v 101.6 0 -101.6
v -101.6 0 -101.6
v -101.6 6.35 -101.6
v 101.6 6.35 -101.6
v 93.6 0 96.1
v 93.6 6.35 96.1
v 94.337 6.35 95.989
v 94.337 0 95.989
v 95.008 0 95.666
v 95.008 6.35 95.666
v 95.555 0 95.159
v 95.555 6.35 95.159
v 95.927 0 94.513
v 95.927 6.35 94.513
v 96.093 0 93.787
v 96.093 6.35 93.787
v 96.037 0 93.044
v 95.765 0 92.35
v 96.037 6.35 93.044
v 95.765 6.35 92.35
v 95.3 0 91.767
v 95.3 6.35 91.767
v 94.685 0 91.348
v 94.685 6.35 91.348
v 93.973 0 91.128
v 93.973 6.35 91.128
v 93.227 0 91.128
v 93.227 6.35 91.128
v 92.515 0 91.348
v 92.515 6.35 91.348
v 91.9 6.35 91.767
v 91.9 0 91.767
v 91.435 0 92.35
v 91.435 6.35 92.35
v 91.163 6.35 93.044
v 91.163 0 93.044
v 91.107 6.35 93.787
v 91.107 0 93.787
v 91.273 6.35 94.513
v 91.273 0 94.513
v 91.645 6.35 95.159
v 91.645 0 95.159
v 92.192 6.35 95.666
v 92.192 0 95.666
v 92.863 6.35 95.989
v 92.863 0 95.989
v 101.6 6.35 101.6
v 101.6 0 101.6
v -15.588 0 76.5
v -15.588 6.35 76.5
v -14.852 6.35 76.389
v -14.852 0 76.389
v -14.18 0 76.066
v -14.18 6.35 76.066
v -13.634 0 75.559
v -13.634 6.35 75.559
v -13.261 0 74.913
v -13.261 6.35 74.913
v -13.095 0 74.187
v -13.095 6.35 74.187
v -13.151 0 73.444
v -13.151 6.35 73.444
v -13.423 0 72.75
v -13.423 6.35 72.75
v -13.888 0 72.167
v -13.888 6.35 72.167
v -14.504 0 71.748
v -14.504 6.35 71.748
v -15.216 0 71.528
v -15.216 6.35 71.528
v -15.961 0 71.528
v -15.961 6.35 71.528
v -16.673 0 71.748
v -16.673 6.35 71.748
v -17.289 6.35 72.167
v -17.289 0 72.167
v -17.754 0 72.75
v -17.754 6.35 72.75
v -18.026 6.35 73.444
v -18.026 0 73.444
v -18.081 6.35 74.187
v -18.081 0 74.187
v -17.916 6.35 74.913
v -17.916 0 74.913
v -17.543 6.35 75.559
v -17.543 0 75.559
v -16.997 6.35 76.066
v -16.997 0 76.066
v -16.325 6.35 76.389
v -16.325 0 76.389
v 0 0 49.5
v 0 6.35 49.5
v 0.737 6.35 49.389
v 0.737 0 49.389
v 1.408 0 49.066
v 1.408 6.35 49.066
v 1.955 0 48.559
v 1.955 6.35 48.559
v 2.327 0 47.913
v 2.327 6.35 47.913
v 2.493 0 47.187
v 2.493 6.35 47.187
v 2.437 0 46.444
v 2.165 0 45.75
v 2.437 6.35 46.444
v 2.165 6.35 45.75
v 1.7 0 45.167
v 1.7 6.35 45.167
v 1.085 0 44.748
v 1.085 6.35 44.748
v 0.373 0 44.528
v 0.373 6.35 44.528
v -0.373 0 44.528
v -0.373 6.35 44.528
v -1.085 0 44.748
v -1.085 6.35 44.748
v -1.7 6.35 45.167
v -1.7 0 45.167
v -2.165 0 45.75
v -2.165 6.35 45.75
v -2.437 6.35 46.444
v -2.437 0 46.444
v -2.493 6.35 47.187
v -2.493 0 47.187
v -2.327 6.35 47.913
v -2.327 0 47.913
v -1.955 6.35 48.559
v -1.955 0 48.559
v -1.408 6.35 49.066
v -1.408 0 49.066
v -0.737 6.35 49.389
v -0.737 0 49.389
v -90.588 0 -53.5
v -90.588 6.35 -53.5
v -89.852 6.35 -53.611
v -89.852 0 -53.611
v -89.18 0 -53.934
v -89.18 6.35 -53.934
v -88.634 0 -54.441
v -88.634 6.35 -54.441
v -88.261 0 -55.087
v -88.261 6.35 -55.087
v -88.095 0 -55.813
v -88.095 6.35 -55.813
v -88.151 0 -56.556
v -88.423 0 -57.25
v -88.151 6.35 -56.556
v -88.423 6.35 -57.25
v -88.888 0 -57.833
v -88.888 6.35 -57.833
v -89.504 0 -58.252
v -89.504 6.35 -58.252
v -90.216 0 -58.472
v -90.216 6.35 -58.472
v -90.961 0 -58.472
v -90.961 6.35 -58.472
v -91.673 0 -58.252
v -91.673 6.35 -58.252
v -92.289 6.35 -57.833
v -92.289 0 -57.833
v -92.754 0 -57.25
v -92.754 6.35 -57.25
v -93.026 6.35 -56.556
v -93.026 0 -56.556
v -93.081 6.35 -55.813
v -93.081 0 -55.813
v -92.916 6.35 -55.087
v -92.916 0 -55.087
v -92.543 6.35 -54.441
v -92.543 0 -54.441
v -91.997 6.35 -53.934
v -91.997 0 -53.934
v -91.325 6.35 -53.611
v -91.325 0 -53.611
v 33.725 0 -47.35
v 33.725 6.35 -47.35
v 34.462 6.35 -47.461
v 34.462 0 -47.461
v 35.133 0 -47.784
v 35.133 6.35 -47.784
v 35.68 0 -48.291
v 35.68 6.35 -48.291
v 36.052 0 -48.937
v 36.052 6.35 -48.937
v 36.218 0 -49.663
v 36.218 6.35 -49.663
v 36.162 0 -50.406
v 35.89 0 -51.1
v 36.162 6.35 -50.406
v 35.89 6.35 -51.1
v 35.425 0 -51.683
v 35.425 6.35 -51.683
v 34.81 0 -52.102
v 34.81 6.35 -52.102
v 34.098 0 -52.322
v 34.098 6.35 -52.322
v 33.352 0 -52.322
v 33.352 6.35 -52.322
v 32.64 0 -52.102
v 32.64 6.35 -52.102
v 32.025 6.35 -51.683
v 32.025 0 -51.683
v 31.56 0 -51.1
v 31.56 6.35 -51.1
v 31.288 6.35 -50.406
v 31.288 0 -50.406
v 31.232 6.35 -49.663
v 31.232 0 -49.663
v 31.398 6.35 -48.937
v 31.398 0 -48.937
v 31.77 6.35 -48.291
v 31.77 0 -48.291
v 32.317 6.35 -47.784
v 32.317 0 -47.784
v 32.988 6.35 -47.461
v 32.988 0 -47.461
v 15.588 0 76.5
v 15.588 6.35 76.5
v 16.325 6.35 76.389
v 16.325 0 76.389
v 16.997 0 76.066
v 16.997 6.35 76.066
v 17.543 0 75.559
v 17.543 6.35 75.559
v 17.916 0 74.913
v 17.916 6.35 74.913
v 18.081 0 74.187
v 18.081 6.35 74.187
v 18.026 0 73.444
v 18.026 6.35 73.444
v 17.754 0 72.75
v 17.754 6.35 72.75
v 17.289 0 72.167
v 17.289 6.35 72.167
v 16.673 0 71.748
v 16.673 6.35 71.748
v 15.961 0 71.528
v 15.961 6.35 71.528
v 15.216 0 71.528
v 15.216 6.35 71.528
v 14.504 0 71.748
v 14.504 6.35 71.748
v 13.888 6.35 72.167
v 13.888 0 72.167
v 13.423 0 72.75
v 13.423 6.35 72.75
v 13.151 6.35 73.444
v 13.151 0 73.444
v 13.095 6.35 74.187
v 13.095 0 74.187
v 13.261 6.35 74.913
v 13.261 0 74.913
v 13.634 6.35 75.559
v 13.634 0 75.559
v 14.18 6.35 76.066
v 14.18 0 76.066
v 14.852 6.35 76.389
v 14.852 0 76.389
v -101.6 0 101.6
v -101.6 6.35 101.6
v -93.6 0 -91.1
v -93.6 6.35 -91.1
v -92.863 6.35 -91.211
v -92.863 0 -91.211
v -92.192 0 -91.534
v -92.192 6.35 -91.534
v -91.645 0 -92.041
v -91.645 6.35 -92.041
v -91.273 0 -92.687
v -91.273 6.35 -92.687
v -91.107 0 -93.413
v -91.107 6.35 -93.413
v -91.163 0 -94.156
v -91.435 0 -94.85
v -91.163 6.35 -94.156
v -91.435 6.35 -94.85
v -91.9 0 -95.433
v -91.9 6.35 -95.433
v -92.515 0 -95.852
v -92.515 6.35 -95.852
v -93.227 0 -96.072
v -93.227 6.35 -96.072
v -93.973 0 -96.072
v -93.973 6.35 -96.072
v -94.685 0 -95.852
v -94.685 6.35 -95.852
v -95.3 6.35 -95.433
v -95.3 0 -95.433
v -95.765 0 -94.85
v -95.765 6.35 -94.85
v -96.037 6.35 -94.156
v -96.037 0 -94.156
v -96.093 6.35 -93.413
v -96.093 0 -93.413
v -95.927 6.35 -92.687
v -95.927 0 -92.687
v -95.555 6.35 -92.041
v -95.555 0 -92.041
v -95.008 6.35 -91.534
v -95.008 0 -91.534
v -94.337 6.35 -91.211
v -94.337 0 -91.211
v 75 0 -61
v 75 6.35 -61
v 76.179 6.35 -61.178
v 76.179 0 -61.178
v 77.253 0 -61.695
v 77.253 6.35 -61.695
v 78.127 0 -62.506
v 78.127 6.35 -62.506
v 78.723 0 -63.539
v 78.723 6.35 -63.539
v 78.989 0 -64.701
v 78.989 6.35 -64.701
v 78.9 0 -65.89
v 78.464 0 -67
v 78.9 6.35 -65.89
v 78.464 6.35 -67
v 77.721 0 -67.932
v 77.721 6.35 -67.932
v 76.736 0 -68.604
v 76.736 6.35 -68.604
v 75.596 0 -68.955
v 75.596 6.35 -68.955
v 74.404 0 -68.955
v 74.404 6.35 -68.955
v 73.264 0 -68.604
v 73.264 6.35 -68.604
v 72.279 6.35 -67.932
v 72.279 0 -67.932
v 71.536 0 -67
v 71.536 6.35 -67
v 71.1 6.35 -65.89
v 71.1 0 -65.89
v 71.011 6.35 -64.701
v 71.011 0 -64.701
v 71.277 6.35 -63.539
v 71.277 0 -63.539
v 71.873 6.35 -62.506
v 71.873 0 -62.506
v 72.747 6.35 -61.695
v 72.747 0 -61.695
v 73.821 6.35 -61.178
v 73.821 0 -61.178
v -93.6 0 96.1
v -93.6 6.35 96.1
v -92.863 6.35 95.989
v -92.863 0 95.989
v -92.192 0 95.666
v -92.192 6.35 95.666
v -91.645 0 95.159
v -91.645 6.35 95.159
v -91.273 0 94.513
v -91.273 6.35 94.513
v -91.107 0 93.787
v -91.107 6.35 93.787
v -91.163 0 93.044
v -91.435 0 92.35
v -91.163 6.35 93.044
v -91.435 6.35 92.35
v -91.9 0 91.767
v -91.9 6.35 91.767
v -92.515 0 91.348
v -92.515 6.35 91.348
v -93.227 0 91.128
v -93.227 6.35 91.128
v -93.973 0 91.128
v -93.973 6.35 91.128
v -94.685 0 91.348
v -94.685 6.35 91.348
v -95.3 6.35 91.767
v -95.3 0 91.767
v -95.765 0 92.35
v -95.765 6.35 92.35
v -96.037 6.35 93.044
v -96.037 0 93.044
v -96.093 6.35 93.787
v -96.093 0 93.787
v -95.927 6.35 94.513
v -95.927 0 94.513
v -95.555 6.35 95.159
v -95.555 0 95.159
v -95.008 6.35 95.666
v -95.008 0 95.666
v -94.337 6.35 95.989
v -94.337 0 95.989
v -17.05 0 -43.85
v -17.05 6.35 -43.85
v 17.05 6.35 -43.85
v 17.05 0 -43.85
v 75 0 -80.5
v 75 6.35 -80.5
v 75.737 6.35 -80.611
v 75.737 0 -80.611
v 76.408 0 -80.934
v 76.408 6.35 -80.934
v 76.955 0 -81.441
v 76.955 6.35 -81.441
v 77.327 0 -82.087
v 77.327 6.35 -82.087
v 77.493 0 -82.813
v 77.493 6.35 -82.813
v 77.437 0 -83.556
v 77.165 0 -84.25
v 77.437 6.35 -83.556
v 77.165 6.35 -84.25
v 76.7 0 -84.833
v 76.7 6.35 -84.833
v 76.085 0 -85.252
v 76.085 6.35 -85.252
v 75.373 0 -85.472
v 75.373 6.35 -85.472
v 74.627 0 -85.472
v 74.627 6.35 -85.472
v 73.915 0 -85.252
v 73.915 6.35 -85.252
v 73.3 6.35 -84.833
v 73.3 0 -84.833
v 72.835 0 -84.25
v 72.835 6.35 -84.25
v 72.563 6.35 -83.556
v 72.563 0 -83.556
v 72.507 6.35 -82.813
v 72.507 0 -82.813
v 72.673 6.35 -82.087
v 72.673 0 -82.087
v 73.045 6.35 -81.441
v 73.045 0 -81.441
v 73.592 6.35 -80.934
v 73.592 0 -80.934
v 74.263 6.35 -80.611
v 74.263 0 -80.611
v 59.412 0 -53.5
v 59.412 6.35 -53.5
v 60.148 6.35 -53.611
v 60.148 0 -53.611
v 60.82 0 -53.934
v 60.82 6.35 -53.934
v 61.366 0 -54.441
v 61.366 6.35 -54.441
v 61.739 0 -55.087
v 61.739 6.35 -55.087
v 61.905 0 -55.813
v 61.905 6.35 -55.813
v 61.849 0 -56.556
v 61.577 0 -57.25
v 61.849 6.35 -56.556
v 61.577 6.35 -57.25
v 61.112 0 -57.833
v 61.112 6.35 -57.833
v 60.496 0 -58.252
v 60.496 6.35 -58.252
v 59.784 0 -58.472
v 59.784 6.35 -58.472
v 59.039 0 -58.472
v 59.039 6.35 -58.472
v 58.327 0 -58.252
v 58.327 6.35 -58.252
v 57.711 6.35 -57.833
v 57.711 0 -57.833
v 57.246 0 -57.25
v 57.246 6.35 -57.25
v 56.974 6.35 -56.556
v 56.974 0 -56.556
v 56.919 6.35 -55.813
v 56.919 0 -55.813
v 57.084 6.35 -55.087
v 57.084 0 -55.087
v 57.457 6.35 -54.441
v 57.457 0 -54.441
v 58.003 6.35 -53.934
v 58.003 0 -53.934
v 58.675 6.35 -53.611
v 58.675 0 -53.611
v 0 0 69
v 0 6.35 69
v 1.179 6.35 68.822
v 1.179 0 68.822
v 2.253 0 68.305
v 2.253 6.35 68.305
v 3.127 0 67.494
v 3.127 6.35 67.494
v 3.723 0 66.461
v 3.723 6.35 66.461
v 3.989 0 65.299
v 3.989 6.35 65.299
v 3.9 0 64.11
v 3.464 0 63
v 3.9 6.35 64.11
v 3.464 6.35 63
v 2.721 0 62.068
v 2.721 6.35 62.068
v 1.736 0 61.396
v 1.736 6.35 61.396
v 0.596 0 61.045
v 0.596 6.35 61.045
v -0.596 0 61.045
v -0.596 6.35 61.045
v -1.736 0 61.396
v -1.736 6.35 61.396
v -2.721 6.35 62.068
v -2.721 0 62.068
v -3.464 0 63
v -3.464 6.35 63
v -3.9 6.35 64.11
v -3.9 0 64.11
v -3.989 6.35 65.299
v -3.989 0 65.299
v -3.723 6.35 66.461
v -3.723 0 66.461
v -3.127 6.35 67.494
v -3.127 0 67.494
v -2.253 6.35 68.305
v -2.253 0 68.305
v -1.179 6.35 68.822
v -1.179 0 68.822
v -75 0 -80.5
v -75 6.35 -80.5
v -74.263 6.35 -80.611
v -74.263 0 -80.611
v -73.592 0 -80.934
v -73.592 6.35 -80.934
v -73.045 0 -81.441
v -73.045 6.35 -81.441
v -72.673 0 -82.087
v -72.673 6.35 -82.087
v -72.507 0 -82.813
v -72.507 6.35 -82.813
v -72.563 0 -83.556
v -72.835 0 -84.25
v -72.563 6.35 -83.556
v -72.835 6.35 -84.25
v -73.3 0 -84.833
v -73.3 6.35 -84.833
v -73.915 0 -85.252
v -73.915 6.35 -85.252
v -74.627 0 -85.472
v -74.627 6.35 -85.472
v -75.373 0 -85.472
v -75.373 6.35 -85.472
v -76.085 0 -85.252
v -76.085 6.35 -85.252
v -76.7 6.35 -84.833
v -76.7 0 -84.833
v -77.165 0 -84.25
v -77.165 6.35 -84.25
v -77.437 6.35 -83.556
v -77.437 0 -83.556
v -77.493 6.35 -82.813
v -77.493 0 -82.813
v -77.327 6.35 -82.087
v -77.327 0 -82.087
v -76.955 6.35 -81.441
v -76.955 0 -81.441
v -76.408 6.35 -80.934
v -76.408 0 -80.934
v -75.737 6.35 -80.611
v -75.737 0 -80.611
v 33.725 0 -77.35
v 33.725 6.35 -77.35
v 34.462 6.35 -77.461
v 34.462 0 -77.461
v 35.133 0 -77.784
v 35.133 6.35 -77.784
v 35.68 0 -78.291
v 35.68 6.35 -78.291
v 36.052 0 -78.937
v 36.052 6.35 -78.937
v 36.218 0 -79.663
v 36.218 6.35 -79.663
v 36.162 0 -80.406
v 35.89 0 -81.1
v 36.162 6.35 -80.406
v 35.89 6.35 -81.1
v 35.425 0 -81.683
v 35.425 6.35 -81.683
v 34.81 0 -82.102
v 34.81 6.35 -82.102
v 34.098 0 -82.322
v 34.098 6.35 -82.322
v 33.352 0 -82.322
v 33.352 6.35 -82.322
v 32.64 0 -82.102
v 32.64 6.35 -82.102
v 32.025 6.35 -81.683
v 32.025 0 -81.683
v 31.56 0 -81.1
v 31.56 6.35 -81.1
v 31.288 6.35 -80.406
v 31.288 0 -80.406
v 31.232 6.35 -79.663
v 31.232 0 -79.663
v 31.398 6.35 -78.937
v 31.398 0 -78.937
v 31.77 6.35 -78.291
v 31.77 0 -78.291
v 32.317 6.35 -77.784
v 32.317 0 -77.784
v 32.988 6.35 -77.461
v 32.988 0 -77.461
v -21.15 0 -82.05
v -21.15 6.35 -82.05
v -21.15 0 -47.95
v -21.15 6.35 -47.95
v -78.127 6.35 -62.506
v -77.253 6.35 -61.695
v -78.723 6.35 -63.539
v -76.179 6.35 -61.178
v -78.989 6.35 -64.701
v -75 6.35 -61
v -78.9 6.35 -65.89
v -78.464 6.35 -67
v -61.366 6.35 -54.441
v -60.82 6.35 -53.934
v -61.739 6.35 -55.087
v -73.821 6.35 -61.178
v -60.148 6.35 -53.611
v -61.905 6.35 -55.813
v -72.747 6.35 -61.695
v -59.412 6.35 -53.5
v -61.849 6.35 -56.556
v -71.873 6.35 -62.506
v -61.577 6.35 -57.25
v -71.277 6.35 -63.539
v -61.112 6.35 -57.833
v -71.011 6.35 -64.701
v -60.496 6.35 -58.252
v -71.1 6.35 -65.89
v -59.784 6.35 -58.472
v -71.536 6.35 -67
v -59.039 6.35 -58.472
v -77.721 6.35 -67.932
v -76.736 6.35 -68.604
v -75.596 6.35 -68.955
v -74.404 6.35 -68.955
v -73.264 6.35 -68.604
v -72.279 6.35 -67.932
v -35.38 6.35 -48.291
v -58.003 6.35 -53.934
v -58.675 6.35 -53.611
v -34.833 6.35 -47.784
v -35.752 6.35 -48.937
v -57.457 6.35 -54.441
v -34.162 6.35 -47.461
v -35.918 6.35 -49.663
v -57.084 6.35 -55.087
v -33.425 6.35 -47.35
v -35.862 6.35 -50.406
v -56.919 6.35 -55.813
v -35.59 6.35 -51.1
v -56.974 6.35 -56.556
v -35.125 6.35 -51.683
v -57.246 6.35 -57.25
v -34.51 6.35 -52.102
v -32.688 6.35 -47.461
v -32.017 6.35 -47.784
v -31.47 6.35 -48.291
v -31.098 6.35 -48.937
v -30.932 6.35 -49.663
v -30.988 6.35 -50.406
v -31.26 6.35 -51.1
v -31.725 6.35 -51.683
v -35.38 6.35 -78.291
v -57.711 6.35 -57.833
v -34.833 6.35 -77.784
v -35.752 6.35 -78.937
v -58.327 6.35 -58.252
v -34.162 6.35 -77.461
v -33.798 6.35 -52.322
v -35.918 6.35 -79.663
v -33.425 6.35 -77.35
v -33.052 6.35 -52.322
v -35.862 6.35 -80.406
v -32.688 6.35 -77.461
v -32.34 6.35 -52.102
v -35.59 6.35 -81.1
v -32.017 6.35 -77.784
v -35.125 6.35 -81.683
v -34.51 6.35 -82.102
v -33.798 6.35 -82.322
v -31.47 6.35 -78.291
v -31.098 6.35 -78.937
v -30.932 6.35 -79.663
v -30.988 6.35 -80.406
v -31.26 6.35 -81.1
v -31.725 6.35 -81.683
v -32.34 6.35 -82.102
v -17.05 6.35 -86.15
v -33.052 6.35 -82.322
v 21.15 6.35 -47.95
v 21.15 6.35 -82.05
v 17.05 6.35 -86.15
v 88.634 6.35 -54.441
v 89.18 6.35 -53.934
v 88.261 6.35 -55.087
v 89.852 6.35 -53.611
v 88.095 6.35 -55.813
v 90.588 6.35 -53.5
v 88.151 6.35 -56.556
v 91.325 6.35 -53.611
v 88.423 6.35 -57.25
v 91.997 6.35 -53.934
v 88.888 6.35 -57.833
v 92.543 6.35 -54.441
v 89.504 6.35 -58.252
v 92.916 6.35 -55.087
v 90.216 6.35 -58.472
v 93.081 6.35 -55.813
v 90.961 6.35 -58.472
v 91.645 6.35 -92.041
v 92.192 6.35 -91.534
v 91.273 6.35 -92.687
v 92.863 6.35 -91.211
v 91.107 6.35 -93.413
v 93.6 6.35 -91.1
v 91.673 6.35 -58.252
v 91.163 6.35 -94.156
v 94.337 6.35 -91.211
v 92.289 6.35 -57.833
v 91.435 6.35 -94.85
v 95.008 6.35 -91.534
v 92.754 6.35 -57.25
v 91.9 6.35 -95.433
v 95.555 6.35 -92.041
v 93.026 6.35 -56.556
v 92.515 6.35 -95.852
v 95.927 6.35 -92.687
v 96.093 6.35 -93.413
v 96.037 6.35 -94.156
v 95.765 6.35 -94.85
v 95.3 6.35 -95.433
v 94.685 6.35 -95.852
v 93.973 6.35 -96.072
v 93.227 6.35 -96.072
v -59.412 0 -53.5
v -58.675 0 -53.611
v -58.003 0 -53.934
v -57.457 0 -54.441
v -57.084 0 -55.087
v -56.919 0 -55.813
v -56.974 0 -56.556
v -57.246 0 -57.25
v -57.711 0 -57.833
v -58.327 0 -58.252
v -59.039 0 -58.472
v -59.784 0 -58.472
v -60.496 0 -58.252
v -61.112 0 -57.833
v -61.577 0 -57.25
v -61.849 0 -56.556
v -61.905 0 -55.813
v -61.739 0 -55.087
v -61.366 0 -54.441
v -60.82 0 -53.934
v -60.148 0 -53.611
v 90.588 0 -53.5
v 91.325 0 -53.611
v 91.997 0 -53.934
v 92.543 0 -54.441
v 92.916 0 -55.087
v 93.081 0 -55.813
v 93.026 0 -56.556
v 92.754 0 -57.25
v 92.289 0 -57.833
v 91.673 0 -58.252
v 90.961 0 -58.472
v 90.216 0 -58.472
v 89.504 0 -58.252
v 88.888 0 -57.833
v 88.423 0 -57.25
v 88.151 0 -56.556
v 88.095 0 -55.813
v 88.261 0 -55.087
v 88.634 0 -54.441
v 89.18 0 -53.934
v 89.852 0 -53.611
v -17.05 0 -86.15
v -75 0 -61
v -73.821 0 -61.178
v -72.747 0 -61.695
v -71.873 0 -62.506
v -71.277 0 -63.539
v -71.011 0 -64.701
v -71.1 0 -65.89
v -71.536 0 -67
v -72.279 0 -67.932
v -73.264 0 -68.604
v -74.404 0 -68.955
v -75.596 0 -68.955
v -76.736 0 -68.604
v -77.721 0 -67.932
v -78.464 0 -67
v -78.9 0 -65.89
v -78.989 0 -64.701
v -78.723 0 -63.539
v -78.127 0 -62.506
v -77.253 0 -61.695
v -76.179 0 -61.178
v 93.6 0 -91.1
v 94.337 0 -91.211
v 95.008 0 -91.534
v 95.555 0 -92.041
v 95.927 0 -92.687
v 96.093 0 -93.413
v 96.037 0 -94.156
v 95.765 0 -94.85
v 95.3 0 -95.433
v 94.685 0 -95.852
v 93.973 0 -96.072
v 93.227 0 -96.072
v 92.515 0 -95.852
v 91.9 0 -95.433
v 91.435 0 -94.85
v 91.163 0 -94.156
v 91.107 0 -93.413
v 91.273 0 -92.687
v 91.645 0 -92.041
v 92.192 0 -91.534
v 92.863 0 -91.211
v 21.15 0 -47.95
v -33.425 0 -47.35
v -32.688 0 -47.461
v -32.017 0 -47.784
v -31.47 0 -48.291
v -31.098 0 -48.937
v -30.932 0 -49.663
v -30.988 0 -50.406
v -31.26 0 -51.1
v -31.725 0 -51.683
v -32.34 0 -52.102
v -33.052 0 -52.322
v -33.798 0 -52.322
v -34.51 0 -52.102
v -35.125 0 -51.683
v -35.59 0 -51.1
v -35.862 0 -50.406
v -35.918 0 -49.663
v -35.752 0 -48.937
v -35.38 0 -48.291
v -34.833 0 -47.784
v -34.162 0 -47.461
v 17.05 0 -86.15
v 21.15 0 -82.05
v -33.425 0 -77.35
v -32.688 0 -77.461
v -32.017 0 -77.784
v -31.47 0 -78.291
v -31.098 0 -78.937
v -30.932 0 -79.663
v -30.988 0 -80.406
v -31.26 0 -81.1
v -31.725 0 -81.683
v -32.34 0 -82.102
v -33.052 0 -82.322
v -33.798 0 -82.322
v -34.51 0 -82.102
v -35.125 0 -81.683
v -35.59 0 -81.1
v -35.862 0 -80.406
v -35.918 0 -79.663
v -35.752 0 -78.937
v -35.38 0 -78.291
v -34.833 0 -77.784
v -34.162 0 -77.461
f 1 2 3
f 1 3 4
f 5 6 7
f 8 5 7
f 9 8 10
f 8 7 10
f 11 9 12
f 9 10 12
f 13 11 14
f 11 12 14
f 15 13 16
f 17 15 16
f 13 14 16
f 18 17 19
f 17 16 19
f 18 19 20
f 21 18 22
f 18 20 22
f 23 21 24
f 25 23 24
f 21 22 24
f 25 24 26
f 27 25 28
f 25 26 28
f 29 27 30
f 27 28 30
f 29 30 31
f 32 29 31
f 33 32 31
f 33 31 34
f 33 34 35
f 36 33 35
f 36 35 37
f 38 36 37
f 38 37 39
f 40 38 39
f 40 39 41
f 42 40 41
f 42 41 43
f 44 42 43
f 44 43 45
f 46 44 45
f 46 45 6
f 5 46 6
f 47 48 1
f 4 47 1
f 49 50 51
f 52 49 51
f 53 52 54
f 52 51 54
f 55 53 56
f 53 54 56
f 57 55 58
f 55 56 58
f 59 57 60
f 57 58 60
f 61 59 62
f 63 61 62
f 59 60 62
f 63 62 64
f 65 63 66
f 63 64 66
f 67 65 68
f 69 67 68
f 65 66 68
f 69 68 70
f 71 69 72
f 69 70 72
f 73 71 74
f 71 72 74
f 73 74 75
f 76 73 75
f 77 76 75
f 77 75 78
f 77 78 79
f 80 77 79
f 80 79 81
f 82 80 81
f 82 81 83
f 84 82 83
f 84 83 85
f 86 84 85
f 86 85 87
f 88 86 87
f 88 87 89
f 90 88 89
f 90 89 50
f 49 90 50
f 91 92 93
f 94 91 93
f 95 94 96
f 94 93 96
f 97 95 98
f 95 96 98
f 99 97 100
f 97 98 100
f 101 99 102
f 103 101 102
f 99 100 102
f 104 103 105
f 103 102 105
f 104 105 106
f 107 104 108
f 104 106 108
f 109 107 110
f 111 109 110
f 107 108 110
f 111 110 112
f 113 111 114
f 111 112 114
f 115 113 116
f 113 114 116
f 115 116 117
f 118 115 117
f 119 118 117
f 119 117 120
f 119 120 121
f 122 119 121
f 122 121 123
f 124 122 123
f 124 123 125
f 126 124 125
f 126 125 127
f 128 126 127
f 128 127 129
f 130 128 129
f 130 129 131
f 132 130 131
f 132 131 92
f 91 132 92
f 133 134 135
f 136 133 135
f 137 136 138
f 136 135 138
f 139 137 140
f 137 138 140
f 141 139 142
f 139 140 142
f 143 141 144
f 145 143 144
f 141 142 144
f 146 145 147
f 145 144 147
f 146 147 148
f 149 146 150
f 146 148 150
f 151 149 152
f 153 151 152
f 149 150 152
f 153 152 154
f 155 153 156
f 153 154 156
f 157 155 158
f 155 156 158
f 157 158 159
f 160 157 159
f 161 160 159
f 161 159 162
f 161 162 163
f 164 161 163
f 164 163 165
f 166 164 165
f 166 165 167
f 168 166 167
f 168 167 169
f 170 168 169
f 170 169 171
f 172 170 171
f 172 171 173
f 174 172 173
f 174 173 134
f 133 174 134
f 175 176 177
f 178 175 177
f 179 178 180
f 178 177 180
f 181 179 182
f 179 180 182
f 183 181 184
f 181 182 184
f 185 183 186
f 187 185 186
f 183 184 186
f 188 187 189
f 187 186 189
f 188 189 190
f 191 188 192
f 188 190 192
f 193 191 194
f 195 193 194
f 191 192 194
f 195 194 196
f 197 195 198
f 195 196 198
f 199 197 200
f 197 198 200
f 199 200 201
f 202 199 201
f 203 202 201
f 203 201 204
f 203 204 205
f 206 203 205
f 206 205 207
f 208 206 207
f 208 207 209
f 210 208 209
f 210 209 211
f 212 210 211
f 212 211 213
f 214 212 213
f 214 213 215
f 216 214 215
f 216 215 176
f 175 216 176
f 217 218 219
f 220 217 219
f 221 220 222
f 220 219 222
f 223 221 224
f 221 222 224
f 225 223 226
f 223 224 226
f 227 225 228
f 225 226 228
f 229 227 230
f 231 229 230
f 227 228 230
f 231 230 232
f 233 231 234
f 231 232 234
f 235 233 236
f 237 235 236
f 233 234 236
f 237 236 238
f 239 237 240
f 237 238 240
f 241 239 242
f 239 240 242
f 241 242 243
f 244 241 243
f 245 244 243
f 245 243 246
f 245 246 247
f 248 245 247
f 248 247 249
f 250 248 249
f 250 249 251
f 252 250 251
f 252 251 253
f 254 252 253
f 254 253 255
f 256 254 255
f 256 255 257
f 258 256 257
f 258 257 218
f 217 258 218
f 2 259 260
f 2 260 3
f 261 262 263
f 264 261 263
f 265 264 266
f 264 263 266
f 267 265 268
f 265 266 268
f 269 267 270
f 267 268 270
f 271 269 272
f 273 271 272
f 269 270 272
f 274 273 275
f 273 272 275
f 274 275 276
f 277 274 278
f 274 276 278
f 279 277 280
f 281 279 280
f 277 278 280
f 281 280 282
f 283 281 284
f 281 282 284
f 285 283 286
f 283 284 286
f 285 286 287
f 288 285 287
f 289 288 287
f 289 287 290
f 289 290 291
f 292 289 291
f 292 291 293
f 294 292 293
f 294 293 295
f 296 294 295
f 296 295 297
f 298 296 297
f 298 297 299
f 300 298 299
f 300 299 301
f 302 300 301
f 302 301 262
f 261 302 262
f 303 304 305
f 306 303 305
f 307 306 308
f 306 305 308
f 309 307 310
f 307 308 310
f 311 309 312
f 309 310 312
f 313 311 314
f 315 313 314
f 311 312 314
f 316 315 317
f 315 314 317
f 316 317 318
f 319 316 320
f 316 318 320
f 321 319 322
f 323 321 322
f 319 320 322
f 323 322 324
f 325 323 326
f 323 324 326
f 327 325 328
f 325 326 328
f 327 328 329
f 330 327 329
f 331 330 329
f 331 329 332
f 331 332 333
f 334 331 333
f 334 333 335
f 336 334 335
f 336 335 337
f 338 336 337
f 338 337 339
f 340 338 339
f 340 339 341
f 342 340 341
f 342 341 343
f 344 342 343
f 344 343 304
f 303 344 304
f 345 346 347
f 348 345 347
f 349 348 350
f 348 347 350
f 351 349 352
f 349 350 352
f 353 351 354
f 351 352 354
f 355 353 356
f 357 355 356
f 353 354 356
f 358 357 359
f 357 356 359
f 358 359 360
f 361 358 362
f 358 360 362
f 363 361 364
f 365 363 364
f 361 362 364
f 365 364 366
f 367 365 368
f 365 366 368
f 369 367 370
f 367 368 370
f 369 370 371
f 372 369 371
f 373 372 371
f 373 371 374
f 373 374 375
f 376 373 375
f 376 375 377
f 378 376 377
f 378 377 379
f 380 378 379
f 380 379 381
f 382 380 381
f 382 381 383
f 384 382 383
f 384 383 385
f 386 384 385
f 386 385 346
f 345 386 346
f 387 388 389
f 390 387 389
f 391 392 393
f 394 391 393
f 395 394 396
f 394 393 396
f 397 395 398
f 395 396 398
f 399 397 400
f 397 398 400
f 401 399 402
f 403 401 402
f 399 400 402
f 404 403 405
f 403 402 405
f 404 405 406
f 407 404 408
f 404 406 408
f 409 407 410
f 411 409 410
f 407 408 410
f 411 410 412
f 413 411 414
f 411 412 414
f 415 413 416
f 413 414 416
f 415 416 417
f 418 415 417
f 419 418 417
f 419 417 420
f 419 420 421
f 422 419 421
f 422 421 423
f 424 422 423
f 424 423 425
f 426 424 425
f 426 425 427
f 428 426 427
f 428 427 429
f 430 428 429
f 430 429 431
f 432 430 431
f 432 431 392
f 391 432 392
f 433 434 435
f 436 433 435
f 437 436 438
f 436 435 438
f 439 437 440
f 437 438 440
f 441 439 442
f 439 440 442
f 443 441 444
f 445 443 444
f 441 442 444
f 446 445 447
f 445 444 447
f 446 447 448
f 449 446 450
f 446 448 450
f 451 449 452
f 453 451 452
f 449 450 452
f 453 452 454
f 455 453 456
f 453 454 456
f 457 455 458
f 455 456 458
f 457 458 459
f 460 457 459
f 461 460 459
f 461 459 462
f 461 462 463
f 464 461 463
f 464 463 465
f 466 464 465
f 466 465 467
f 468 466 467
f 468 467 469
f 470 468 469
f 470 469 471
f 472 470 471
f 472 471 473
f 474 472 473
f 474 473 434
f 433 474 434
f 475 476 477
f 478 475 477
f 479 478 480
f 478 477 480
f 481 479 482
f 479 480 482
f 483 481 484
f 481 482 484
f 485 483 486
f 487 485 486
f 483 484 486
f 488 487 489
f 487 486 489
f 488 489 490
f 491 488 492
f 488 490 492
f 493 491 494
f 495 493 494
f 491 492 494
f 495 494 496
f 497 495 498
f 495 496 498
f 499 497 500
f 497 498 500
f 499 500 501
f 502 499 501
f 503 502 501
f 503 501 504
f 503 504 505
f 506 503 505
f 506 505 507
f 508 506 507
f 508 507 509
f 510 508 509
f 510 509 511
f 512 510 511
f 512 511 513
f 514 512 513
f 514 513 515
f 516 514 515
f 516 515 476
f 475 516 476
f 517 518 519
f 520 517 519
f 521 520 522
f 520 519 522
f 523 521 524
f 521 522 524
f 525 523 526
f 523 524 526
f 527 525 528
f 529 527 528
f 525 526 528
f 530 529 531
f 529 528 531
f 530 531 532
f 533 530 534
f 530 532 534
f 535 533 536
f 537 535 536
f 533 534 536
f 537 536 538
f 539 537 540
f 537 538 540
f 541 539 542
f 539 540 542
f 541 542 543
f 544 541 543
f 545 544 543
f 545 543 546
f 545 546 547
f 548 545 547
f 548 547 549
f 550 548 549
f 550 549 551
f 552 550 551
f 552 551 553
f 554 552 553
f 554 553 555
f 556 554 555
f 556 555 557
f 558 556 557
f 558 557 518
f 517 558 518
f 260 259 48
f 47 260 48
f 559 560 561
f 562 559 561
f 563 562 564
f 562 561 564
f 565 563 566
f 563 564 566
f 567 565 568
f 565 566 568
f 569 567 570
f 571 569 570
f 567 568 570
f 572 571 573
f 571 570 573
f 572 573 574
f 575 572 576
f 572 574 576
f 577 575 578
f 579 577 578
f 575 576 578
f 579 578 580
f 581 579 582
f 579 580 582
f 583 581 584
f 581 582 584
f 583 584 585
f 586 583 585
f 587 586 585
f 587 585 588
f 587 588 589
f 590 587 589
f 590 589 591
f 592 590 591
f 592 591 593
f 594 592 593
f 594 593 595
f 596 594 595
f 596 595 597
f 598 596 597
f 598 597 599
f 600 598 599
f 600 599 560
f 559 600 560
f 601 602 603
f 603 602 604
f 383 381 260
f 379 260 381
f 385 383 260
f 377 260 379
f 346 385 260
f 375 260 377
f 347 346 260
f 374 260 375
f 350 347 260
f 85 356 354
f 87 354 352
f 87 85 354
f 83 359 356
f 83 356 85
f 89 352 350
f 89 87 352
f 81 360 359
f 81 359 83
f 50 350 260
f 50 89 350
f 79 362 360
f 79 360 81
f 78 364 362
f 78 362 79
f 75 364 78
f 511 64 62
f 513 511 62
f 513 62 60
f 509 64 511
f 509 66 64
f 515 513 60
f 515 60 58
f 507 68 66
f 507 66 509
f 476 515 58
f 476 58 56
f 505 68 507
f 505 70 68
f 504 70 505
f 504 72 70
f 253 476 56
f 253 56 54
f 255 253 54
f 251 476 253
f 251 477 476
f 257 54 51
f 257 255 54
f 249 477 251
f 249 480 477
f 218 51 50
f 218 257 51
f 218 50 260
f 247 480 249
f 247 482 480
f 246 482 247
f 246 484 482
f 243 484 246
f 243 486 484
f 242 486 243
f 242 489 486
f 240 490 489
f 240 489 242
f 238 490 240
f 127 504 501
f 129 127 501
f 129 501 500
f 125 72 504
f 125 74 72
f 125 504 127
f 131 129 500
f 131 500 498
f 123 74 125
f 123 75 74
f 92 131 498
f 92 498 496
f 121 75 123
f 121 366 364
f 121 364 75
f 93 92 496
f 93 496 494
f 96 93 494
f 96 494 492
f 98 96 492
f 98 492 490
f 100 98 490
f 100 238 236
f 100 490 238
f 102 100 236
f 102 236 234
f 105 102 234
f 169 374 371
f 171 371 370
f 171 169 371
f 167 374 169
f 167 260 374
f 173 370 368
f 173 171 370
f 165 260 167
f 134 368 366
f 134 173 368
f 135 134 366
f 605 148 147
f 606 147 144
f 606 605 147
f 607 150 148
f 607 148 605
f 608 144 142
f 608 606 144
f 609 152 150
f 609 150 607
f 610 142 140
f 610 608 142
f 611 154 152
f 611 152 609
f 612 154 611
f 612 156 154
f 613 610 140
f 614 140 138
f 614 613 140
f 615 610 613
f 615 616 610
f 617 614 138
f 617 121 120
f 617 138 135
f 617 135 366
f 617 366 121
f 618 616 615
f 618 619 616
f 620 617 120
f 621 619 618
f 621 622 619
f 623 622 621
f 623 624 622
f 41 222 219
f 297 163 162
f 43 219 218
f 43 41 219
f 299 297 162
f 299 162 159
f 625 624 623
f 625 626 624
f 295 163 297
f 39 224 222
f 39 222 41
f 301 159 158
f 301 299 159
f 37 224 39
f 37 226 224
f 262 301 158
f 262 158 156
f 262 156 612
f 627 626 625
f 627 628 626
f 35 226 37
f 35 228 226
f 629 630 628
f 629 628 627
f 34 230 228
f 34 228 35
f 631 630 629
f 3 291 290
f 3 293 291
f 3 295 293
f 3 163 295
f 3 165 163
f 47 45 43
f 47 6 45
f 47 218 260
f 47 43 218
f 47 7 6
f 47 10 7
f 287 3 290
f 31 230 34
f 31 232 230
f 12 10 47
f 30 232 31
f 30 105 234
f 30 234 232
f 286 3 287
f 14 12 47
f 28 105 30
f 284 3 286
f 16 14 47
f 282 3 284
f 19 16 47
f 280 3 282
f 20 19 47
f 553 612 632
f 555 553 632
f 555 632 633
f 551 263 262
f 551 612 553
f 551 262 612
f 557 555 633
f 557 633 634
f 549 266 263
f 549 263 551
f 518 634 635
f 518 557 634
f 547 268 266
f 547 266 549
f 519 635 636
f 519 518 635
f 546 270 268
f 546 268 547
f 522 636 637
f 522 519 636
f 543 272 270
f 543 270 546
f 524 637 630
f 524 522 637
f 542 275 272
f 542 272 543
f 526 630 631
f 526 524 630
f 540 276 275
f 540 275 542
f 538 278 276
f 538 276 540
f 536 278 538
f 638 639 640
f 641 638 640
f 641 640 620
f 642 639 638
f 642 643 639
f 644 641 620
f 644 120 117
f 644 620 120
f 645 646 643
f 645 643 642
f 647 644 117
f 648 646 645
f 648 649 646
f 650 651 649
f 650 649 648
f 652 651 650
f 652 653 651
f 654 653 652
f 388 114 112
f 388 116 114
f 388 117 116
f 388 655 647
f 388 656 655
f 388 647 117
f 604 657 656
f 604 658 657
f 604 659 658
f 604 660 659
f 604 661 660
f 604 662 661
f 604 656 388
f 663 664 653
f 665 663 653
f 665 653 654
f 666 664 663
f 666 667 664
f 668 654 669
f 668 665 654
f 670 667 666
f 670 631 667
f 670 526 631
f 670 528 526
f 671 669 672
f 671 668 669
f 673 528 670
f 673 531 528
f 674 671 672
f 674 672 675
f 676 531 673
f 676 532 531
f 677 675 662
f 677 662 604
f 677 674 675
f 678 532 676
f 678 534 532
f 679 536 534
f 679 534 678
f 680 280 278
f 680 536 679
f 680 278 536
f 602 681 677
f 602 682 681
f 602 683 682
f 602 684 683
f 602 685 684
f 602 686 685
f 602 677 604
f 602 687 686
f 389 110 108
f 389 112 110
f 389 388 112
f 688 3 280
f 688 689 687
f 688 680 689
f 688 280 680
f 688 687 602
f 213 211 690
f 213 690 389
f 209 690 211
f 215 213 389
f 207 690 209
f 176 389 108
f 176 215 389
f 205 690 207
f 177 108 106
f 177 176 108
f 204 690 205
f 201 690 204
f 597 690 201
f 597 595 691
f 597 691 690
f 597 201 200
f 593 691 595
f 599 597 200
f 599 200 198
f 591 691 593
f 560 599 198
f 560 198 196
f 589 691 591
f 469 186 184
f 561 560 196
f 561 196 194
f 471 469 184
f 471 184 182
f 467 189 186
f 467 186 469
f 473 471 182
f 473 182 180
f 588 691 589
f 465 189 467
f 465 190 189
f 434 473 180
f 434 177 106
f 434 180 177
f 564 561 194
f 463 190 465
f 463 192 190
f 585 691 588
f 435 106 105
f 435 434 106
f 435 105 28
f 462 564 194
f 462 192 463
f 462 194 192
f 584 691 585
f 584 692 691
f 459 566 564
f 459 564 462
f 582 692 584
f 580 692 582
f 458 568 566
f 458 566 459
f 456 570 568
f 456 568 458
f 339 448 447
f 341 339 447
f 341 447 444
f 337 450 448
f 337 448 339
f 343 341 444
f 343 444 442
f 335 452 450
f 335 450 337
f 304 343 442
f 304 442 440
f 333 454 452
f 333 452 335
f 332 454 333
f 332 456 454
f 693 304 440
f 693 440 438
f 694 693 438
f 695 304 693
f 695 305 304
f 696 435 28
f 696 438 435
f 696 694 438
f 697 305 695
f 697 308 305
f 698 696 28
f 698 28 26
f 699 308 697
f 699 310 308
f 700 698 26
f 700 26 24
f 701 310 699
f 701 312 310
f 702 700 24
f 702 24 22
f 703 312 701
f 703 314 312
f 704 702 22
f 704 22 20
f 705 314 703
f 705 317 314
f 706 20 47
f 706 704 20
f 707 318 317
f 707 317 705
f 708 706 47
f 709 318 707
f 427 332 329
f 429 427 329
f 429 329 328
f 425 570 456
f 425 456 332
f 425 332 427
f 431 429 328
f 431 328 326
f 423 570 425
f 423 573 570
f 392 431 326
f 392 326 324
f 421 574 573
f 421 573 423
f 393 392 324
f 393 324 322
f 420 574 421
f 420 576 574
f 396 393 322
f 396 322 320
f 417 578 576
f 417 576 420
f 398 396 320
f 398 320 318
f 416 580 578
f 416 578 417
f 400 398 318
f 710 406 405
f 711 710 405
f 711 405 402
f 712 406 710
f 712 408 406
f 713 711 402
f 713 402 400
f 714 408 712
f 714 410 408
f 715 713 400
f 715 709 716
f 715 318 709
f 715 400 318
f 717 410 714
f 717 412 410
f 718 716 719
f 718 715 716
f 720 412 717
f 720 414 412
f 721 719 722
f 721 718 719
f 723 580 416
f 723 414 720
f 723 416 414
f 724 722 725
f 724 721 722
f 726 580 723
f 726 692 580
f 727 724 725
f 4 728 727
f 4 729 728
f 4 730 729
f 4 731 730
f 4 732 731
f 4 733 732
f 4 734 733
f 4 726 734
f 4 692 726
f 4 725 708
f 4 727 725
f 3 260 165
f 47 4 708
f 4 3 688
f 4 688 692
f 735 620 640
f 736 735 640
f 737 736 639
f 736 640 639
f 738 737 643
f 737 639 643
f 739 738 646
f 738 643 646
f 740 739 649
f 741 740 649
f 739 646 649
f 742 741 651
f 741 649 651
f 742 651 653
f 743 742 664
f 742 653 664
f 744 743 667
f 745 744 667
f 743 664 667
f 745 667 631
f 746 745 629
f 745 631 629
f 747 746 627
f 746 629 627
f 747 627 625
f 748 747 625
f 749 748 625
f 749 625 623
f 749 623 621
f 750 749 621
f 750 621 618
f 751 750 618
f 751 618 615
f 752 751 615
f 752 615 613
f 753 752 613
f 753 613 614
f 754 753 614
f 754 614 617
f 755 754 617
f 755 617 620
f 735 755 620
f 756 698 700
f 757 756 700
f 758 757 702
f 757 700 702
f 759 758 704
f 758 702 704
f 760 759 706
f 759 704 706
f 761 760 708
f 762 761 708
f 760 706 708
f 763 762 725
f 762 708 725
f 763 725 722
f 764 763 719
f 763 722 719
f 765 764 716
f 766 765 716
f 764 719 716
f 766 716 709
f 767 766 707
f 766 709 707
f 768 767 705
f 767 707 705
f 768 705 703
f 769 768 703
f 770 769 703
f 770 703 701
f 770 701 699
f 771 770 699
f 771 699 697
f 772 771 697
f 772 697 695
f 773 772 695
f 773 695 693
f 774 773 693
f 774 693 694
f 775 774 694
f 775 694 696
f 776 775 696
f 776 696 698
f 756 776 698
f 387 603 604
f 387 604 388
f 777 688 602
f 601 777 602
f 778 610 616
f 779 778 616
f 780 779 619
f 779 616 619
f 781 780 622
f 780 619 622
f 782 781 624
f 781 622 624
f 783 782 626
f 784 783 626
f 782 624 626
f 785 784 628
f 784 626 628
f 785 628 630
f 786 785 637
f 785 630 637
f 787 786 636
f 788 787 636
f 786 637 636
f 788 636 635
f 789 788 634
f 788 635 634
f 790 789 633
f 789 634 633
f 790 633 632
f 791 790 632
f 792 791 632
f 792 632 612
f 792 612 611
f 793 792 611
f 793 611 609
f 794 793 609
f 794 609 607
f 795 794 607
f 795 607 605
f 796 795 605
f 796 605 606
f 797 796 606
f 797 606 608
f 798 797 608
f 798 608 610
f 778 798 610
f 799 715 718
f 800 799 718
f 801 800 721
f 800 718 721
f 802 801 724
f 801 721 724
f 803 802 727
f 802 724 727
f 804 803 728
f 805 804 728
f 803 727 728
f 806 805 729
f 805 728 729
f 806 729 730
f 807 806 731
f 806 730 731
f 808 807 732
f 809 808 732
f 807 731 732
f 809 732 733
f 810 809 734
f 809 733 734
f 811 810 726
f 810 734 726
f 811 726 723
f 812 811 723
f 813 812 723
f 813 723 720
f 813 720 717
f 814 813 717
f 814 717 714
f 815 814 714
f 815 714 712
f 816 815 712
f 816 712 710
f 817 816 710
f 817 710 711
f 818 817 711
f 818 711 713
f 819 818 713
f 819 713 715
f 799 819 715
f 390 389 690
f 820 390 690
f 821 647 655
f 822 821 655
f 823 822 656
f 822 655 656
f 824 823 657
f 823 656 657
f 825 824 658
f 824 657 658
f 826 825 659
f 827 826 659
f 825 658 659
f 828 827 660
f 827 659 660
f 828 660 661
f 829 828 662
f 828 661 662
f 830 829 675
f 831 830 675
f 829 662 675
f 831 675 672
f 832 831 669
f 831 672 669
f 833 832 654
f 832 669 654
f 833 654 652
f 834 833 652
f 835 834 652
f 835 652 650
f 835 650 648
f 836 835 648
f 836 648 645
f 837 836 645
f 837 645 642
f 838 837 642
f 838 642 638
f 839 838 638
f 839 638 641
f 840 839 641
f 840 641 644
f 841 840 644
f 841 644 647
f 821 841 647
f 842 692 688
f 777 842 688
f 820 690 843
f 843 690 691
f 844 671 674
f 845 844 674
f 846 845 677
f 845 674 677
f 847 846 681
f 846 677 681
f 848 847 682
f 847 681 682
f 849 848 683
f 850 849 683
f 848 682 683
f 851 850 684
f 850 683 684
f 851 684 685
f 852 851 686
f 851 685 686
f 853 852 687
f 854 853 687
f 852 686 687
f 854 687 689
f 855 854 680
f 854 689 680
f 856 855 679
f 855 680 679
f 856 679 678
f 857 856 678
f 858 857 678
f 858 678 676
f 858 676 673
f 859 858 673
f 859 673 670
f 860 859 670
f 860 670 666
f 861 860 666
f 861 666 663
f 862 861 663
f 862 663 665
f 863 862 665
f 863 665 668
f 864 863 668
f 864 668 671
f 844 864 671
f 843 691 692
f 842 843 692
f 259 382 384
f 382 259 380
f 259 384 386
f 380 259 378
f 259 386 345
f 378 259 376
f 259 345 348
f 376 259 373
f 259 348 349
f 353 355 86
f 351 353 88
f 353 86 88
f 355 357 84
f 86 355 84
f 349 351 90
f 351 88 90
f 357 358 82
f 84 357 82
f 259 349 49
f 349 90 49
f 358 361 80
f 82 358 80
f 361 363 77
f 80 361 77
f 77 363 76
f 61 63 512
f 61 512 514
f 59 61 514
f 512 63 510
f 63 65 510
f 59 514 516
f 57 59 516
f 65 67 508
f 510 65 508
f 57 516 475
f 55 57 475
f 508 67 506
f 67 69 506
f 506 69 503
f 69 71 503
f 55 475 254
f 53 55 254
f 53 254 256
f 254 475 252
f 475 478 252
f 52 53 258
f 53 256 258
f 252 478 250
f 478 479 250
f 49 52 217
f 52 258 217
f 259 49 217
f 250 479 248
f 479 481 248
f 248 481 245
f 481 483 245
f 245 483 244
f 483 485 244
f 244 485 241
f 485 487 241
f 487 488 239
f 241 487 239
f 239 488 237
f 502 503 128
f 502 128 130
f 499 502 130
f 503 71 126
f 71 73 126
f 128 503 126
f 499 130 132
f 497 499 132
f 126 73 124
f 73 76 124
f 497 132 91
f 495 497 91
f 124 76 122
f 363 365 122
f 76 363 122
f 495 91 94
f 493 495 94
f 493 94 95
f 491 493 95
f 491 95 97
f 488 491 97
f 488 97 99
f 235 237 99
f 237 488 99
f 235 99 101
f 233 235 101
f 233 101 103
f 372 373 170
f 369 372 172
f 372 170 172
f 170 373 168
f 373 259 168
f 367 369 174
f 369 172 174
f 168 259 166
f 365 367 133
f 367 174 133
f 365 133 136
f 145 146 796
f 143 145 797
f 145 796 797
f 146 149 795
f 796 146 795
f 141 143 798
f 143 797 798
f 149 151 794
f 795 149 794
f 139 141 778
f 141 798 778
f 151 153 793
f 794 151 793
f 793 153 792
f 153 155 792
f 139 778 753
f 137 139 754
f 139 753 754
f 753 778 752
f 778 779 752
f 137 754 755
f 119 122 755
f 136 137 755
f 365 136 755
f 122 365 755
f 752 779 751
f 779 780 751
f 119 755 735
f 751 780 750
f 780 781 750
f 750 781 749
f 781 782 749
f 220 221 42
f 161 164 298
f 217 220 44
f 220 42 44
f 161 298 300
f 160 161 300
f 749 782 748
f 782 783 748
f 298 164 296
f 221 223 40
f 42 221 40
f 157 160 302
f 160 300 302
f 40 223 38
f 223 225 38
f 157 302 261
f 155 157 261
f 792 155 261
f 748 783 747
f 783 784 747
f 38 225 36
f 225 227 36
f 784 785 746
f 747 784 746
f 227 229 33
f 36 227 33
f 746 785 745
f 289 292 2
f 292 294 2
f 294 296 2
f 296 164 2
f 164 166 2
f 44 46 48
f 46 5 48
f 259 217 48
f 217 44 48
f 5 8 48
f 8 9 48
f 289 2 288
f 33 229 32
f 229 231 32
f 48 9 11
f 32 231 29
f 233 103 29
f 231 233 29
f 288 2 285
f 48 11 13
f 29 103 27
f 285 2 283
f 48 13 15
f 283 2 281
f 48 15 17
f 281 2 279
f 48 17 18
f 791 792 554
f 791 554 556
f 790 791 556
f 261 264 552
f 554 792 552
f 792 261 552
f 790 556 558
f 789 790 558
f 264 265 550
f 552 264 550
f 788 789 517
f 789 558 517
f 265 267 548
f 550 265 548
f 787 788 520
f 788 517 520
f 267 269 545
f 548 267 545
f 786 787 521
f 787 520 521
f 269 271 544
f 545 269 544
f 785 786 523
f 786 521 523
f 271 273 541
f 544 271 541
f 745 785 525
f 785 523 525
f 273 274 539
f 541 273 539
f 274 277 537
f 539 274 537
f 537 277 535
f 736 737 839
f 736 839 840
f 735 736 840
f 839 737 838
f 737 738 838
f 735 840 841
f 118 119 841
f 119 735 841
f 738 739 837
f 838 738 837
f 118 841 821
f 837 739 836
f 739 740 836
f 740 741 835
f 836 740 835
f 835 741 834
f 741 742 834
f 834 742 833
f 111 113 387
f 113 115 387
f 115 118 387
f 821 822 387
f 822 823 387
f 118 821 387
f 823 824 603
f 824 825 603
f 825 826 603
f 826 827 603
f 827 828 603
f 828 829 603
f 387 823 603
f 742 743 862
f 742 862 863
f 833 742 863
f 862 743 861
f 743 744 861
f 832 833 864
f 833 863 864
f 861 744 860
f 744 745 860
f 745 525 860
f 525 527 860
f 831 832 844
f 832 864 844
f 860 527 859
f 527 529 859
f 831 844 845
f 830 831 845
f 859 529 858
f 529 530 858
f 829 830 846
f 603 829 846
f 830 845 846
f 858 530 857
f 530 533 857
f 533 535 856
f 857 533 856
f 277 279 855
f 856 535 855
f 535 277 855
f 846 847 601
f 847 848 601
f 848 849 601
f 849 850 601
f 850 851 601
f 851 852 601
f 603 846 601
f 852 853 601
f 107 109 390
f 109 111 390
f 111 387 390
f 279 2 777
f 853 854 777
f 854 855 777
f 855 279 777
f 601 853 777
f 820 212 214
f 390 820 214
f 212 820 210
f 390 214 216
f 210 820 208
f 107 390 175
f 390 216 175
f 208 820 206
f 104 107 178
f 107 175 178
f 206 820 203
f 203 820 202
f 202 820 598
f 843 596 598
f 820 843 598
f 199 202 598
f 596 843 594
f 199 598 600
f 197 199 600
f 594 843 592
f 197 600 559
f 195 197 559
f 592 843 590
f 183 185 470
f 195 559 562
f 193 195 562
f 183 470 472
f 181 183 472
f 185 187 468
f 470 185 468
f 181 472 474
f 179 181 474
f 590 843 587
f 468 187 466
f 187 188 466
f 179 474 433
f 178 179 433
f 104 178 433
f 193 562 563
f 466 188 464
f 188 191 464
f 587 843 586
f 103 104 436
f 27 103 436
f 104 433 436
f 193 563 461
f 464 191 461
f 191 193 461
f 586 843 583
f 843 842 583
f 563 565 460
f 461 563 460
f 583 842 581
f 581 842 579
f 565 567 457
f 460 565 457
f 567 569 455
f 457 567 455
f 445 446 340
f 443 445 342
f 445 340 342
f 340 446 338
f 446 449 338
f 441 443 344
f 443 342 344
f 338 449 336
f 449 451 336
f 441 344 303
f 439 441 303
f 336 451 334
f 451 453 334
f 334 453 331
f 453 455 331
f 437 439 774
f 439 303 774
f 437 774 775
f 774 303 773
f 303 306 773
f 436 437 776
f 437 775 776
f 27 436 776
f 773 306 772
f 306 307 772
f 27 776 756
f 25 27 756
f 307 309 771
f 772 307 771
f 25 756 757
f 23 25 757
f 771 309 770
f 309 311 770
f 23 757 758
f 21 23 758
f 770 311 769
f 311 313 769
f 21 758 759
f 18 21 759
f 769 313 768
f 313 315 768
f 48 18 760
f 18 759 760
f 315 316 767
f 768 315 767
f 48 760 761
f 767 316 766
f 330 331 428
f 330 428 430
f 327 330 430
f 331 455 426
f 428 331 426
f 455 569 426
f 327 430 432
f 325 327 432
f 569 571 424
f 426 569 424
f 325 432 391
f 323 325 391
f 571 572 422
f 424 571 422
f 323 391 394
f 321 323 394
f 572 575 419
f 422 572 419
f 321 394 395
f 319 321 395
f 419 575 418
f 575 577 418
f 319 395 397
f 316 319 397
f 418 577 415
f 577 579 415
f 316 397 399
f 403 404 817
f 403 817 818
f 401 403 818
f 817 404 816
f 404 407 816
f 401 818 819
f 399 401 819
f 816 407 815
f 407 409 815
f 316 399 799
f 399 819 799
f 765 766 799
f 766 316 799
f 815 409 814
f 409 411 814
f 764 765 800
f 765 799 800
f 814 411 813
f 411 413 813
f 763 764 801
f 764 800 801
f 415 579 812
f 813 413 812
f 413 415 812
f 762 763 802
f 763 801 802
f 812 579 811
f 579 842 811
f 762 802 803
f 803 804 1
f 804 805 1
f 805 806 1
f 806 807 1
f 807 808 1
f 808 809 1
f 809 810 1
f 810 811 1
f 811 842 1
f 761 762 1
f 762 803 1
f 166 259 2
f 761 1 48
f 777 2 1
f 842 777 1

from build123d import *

# Parameters (mm, degrees)
ESQUISSE1_W             = 203.2
ESQUISSE1_H             = 203.2
BOSS_EXTRU_1_DEPTH      = 6.35
ESQUISSE2_R             = 4
ENL_V_MAT_EXTRU_1_DEPTH = 144.824345992
ENL_V_MAT_EXTRU_2_DEPTH = 144.824345992
ESQUISSE5_R             = 2.5
ENL_V_MAT_EXTRU_4_DEPTH = 144.824345992
ESQUISSE6_R             = 2.5
ENL_V_MAT_EXTRU_5_DEPTH = 144.824345992
ESQUISSE7_R             = 2.5
ENL_V_MAT_EXTRU_6_DEPTH = 144.824345992


with BuildPart() as part:
    # Esquisse1 → Boss.-Extru.1 (new body)
    with BuildSketch(Plane(origin=(0, 0, 0), x_dir=(1, 0, 0), z_dir=(0, 1, 0))):
        Rectangle(ESQUISSE1_W, ESQUISSE1_H)
    extrude(amount=BOSS_EXTRU_1_DEPTH)

    # Esquisse2 → Enlèv. mat.-Extru.1 (cut, through all)
    with BuildSketch(Plane(origin=(0, 6.35, 0), x_dir=(1, 0, 0), z_dir=(0, 1, 0))):
        with Locations(Location((-75, 65, 0), (0, 0, 270))):
            Circle(ESQUISSE2_R)
        with Locations(Location((75, 65, 0), (0, 0, 270))):
            Circle(ESQUISSE2_R)
        with Locations(Location((0, -65, 0), (0, 0, 270))):
            Circle(ESQUISSE2_R)
    extrude(amount=-ENL_V_MAT_EXTRU_1_DEPTH, mode=Mode.SUBTRACT)

    # Esquisse3 → Enlèv. mat.-Extru.2 (cut, through all)
    with BuildSketch(Plane(origin=(0, 6.35, 0), x_dir=(1, 0, 0), z_dir=(0, 1, 0))):
        Polygon((-17.05, 86.15), (-21.15, 82.05), (-21.15, 47.95), (-17.05, 43.85), (17.05, 43.85), (21.15, 47.95), (21.15, 82.05), (17.05, 86.15), align=None)
    extrude(amount=-ENL_V_MAT_EXTRU_2_DEPTH, mode=Mode.SUBTRACT)

    # Esquisse5 → Enlèv. mat.-Extru.4 (cut, through all)
    with BuildSketch(Plane(origin=(0, 6.35, 0), x_dir=(1, 0, 0), z_dir=(0, 1, 0))):
        with Locations(Location((-33.425, 49.85, 0), (0, 0, 270))):
            Circle(ESQUISSE5_R)
        with Locations(Location((-33.425, 79.85, 0), (0, 0, 270))):
            Circle(ESQUISSE5_R)
        with Locations(Location((33.725, 49.85, 0), (0, 0, 270))):
            Circle(ESQUISSE5_R)
        with Locations(Location((33.725, 79.85, 0), (0, 0, 270))):
            Circle(ESQUISSE5_R)
    extrude(amount=-ENL_V_MAT_EXTRU_4_DEPTH, mode=Mode.SUBTRACT)

    # Esquisse6 → Enlèv. mat.-Extru.5 (cut, through all)
    with BuildSketch(Plane(origin=(0, 6.35, 0), x_dir=(1, 0, 0), z_dir=(0, 1, 0))):
        with Locations(Location((93.6, -93.6, 0), (0, 0, 270))):
            Circle(ESQUISSE6_R)
        with Locations(Location((-93.6, -93.6, 0), (0, 0, 270))):
            Circle(ESQUISSE6_R)
        with Locations(Location((-93.6, 93.6, 0), (0, 0, 270))):
            Circle(ESQUISSE6_R)
        with Locations(Location((93.6, 93.6, 0), (0, 0, 270))):
            Circle(ESQUISSE6_R)
    extrude(amount=-ENL_V_MAT_EXTRU_5_DEPTH, mode=Mode.SUBTRACT)

    # Esquisse7 → Enlèv. mat.-Extru.6 (cut, through all)
    with BuildSketch(Plane(origin=(0, 6.35, 0), x_dir=(1, 0, 0), z_dir=(0, 1, 0))):
        with Locations(Location((-15.588457268, -74, 0), (0, 0, 270))):
            Circle(ESQUISSE7_R)
        with Locations(Location((15.588457268, -74, 0), (0, 0, 270))):
            Circle(ESQUISSE7_R)
        with Locations(Location((0, -47, 0), (0, 0, 270))):
            Circle(ESQUISSE7_R)
        with Locations(Location((90.588457268, 56, 0), (0, 0, 270))):
            Circle(ESQUISSE7_R)
        with Locations(Location((59.411542732, 56, 0), (0, 0, 270))):
            Circle(ESQUISSE7_R)
        with Locations(Location((75, 83, 0), (0, 0, 270))):
            Circle(ESQUISSE7_R)
        with Locations(Location((-90.588457268, 56, 0), (0, 0, 270))):
            Circle(ESQUISSE7_R)
        with Locations(Location((-59.411542732, 56, 0), (0, 0, 270))):
            Circle(ESQUISSE7_R)
        with Locations(Location((-75, 83, 0), (0, 0, 270))):
            Circle(ESQUISSE7_R)
    extrude(amount=-ENL_V_MAT_EXTRU_6_DEPTH, mode=Mode.SUBTRACT)


solid = part.part
